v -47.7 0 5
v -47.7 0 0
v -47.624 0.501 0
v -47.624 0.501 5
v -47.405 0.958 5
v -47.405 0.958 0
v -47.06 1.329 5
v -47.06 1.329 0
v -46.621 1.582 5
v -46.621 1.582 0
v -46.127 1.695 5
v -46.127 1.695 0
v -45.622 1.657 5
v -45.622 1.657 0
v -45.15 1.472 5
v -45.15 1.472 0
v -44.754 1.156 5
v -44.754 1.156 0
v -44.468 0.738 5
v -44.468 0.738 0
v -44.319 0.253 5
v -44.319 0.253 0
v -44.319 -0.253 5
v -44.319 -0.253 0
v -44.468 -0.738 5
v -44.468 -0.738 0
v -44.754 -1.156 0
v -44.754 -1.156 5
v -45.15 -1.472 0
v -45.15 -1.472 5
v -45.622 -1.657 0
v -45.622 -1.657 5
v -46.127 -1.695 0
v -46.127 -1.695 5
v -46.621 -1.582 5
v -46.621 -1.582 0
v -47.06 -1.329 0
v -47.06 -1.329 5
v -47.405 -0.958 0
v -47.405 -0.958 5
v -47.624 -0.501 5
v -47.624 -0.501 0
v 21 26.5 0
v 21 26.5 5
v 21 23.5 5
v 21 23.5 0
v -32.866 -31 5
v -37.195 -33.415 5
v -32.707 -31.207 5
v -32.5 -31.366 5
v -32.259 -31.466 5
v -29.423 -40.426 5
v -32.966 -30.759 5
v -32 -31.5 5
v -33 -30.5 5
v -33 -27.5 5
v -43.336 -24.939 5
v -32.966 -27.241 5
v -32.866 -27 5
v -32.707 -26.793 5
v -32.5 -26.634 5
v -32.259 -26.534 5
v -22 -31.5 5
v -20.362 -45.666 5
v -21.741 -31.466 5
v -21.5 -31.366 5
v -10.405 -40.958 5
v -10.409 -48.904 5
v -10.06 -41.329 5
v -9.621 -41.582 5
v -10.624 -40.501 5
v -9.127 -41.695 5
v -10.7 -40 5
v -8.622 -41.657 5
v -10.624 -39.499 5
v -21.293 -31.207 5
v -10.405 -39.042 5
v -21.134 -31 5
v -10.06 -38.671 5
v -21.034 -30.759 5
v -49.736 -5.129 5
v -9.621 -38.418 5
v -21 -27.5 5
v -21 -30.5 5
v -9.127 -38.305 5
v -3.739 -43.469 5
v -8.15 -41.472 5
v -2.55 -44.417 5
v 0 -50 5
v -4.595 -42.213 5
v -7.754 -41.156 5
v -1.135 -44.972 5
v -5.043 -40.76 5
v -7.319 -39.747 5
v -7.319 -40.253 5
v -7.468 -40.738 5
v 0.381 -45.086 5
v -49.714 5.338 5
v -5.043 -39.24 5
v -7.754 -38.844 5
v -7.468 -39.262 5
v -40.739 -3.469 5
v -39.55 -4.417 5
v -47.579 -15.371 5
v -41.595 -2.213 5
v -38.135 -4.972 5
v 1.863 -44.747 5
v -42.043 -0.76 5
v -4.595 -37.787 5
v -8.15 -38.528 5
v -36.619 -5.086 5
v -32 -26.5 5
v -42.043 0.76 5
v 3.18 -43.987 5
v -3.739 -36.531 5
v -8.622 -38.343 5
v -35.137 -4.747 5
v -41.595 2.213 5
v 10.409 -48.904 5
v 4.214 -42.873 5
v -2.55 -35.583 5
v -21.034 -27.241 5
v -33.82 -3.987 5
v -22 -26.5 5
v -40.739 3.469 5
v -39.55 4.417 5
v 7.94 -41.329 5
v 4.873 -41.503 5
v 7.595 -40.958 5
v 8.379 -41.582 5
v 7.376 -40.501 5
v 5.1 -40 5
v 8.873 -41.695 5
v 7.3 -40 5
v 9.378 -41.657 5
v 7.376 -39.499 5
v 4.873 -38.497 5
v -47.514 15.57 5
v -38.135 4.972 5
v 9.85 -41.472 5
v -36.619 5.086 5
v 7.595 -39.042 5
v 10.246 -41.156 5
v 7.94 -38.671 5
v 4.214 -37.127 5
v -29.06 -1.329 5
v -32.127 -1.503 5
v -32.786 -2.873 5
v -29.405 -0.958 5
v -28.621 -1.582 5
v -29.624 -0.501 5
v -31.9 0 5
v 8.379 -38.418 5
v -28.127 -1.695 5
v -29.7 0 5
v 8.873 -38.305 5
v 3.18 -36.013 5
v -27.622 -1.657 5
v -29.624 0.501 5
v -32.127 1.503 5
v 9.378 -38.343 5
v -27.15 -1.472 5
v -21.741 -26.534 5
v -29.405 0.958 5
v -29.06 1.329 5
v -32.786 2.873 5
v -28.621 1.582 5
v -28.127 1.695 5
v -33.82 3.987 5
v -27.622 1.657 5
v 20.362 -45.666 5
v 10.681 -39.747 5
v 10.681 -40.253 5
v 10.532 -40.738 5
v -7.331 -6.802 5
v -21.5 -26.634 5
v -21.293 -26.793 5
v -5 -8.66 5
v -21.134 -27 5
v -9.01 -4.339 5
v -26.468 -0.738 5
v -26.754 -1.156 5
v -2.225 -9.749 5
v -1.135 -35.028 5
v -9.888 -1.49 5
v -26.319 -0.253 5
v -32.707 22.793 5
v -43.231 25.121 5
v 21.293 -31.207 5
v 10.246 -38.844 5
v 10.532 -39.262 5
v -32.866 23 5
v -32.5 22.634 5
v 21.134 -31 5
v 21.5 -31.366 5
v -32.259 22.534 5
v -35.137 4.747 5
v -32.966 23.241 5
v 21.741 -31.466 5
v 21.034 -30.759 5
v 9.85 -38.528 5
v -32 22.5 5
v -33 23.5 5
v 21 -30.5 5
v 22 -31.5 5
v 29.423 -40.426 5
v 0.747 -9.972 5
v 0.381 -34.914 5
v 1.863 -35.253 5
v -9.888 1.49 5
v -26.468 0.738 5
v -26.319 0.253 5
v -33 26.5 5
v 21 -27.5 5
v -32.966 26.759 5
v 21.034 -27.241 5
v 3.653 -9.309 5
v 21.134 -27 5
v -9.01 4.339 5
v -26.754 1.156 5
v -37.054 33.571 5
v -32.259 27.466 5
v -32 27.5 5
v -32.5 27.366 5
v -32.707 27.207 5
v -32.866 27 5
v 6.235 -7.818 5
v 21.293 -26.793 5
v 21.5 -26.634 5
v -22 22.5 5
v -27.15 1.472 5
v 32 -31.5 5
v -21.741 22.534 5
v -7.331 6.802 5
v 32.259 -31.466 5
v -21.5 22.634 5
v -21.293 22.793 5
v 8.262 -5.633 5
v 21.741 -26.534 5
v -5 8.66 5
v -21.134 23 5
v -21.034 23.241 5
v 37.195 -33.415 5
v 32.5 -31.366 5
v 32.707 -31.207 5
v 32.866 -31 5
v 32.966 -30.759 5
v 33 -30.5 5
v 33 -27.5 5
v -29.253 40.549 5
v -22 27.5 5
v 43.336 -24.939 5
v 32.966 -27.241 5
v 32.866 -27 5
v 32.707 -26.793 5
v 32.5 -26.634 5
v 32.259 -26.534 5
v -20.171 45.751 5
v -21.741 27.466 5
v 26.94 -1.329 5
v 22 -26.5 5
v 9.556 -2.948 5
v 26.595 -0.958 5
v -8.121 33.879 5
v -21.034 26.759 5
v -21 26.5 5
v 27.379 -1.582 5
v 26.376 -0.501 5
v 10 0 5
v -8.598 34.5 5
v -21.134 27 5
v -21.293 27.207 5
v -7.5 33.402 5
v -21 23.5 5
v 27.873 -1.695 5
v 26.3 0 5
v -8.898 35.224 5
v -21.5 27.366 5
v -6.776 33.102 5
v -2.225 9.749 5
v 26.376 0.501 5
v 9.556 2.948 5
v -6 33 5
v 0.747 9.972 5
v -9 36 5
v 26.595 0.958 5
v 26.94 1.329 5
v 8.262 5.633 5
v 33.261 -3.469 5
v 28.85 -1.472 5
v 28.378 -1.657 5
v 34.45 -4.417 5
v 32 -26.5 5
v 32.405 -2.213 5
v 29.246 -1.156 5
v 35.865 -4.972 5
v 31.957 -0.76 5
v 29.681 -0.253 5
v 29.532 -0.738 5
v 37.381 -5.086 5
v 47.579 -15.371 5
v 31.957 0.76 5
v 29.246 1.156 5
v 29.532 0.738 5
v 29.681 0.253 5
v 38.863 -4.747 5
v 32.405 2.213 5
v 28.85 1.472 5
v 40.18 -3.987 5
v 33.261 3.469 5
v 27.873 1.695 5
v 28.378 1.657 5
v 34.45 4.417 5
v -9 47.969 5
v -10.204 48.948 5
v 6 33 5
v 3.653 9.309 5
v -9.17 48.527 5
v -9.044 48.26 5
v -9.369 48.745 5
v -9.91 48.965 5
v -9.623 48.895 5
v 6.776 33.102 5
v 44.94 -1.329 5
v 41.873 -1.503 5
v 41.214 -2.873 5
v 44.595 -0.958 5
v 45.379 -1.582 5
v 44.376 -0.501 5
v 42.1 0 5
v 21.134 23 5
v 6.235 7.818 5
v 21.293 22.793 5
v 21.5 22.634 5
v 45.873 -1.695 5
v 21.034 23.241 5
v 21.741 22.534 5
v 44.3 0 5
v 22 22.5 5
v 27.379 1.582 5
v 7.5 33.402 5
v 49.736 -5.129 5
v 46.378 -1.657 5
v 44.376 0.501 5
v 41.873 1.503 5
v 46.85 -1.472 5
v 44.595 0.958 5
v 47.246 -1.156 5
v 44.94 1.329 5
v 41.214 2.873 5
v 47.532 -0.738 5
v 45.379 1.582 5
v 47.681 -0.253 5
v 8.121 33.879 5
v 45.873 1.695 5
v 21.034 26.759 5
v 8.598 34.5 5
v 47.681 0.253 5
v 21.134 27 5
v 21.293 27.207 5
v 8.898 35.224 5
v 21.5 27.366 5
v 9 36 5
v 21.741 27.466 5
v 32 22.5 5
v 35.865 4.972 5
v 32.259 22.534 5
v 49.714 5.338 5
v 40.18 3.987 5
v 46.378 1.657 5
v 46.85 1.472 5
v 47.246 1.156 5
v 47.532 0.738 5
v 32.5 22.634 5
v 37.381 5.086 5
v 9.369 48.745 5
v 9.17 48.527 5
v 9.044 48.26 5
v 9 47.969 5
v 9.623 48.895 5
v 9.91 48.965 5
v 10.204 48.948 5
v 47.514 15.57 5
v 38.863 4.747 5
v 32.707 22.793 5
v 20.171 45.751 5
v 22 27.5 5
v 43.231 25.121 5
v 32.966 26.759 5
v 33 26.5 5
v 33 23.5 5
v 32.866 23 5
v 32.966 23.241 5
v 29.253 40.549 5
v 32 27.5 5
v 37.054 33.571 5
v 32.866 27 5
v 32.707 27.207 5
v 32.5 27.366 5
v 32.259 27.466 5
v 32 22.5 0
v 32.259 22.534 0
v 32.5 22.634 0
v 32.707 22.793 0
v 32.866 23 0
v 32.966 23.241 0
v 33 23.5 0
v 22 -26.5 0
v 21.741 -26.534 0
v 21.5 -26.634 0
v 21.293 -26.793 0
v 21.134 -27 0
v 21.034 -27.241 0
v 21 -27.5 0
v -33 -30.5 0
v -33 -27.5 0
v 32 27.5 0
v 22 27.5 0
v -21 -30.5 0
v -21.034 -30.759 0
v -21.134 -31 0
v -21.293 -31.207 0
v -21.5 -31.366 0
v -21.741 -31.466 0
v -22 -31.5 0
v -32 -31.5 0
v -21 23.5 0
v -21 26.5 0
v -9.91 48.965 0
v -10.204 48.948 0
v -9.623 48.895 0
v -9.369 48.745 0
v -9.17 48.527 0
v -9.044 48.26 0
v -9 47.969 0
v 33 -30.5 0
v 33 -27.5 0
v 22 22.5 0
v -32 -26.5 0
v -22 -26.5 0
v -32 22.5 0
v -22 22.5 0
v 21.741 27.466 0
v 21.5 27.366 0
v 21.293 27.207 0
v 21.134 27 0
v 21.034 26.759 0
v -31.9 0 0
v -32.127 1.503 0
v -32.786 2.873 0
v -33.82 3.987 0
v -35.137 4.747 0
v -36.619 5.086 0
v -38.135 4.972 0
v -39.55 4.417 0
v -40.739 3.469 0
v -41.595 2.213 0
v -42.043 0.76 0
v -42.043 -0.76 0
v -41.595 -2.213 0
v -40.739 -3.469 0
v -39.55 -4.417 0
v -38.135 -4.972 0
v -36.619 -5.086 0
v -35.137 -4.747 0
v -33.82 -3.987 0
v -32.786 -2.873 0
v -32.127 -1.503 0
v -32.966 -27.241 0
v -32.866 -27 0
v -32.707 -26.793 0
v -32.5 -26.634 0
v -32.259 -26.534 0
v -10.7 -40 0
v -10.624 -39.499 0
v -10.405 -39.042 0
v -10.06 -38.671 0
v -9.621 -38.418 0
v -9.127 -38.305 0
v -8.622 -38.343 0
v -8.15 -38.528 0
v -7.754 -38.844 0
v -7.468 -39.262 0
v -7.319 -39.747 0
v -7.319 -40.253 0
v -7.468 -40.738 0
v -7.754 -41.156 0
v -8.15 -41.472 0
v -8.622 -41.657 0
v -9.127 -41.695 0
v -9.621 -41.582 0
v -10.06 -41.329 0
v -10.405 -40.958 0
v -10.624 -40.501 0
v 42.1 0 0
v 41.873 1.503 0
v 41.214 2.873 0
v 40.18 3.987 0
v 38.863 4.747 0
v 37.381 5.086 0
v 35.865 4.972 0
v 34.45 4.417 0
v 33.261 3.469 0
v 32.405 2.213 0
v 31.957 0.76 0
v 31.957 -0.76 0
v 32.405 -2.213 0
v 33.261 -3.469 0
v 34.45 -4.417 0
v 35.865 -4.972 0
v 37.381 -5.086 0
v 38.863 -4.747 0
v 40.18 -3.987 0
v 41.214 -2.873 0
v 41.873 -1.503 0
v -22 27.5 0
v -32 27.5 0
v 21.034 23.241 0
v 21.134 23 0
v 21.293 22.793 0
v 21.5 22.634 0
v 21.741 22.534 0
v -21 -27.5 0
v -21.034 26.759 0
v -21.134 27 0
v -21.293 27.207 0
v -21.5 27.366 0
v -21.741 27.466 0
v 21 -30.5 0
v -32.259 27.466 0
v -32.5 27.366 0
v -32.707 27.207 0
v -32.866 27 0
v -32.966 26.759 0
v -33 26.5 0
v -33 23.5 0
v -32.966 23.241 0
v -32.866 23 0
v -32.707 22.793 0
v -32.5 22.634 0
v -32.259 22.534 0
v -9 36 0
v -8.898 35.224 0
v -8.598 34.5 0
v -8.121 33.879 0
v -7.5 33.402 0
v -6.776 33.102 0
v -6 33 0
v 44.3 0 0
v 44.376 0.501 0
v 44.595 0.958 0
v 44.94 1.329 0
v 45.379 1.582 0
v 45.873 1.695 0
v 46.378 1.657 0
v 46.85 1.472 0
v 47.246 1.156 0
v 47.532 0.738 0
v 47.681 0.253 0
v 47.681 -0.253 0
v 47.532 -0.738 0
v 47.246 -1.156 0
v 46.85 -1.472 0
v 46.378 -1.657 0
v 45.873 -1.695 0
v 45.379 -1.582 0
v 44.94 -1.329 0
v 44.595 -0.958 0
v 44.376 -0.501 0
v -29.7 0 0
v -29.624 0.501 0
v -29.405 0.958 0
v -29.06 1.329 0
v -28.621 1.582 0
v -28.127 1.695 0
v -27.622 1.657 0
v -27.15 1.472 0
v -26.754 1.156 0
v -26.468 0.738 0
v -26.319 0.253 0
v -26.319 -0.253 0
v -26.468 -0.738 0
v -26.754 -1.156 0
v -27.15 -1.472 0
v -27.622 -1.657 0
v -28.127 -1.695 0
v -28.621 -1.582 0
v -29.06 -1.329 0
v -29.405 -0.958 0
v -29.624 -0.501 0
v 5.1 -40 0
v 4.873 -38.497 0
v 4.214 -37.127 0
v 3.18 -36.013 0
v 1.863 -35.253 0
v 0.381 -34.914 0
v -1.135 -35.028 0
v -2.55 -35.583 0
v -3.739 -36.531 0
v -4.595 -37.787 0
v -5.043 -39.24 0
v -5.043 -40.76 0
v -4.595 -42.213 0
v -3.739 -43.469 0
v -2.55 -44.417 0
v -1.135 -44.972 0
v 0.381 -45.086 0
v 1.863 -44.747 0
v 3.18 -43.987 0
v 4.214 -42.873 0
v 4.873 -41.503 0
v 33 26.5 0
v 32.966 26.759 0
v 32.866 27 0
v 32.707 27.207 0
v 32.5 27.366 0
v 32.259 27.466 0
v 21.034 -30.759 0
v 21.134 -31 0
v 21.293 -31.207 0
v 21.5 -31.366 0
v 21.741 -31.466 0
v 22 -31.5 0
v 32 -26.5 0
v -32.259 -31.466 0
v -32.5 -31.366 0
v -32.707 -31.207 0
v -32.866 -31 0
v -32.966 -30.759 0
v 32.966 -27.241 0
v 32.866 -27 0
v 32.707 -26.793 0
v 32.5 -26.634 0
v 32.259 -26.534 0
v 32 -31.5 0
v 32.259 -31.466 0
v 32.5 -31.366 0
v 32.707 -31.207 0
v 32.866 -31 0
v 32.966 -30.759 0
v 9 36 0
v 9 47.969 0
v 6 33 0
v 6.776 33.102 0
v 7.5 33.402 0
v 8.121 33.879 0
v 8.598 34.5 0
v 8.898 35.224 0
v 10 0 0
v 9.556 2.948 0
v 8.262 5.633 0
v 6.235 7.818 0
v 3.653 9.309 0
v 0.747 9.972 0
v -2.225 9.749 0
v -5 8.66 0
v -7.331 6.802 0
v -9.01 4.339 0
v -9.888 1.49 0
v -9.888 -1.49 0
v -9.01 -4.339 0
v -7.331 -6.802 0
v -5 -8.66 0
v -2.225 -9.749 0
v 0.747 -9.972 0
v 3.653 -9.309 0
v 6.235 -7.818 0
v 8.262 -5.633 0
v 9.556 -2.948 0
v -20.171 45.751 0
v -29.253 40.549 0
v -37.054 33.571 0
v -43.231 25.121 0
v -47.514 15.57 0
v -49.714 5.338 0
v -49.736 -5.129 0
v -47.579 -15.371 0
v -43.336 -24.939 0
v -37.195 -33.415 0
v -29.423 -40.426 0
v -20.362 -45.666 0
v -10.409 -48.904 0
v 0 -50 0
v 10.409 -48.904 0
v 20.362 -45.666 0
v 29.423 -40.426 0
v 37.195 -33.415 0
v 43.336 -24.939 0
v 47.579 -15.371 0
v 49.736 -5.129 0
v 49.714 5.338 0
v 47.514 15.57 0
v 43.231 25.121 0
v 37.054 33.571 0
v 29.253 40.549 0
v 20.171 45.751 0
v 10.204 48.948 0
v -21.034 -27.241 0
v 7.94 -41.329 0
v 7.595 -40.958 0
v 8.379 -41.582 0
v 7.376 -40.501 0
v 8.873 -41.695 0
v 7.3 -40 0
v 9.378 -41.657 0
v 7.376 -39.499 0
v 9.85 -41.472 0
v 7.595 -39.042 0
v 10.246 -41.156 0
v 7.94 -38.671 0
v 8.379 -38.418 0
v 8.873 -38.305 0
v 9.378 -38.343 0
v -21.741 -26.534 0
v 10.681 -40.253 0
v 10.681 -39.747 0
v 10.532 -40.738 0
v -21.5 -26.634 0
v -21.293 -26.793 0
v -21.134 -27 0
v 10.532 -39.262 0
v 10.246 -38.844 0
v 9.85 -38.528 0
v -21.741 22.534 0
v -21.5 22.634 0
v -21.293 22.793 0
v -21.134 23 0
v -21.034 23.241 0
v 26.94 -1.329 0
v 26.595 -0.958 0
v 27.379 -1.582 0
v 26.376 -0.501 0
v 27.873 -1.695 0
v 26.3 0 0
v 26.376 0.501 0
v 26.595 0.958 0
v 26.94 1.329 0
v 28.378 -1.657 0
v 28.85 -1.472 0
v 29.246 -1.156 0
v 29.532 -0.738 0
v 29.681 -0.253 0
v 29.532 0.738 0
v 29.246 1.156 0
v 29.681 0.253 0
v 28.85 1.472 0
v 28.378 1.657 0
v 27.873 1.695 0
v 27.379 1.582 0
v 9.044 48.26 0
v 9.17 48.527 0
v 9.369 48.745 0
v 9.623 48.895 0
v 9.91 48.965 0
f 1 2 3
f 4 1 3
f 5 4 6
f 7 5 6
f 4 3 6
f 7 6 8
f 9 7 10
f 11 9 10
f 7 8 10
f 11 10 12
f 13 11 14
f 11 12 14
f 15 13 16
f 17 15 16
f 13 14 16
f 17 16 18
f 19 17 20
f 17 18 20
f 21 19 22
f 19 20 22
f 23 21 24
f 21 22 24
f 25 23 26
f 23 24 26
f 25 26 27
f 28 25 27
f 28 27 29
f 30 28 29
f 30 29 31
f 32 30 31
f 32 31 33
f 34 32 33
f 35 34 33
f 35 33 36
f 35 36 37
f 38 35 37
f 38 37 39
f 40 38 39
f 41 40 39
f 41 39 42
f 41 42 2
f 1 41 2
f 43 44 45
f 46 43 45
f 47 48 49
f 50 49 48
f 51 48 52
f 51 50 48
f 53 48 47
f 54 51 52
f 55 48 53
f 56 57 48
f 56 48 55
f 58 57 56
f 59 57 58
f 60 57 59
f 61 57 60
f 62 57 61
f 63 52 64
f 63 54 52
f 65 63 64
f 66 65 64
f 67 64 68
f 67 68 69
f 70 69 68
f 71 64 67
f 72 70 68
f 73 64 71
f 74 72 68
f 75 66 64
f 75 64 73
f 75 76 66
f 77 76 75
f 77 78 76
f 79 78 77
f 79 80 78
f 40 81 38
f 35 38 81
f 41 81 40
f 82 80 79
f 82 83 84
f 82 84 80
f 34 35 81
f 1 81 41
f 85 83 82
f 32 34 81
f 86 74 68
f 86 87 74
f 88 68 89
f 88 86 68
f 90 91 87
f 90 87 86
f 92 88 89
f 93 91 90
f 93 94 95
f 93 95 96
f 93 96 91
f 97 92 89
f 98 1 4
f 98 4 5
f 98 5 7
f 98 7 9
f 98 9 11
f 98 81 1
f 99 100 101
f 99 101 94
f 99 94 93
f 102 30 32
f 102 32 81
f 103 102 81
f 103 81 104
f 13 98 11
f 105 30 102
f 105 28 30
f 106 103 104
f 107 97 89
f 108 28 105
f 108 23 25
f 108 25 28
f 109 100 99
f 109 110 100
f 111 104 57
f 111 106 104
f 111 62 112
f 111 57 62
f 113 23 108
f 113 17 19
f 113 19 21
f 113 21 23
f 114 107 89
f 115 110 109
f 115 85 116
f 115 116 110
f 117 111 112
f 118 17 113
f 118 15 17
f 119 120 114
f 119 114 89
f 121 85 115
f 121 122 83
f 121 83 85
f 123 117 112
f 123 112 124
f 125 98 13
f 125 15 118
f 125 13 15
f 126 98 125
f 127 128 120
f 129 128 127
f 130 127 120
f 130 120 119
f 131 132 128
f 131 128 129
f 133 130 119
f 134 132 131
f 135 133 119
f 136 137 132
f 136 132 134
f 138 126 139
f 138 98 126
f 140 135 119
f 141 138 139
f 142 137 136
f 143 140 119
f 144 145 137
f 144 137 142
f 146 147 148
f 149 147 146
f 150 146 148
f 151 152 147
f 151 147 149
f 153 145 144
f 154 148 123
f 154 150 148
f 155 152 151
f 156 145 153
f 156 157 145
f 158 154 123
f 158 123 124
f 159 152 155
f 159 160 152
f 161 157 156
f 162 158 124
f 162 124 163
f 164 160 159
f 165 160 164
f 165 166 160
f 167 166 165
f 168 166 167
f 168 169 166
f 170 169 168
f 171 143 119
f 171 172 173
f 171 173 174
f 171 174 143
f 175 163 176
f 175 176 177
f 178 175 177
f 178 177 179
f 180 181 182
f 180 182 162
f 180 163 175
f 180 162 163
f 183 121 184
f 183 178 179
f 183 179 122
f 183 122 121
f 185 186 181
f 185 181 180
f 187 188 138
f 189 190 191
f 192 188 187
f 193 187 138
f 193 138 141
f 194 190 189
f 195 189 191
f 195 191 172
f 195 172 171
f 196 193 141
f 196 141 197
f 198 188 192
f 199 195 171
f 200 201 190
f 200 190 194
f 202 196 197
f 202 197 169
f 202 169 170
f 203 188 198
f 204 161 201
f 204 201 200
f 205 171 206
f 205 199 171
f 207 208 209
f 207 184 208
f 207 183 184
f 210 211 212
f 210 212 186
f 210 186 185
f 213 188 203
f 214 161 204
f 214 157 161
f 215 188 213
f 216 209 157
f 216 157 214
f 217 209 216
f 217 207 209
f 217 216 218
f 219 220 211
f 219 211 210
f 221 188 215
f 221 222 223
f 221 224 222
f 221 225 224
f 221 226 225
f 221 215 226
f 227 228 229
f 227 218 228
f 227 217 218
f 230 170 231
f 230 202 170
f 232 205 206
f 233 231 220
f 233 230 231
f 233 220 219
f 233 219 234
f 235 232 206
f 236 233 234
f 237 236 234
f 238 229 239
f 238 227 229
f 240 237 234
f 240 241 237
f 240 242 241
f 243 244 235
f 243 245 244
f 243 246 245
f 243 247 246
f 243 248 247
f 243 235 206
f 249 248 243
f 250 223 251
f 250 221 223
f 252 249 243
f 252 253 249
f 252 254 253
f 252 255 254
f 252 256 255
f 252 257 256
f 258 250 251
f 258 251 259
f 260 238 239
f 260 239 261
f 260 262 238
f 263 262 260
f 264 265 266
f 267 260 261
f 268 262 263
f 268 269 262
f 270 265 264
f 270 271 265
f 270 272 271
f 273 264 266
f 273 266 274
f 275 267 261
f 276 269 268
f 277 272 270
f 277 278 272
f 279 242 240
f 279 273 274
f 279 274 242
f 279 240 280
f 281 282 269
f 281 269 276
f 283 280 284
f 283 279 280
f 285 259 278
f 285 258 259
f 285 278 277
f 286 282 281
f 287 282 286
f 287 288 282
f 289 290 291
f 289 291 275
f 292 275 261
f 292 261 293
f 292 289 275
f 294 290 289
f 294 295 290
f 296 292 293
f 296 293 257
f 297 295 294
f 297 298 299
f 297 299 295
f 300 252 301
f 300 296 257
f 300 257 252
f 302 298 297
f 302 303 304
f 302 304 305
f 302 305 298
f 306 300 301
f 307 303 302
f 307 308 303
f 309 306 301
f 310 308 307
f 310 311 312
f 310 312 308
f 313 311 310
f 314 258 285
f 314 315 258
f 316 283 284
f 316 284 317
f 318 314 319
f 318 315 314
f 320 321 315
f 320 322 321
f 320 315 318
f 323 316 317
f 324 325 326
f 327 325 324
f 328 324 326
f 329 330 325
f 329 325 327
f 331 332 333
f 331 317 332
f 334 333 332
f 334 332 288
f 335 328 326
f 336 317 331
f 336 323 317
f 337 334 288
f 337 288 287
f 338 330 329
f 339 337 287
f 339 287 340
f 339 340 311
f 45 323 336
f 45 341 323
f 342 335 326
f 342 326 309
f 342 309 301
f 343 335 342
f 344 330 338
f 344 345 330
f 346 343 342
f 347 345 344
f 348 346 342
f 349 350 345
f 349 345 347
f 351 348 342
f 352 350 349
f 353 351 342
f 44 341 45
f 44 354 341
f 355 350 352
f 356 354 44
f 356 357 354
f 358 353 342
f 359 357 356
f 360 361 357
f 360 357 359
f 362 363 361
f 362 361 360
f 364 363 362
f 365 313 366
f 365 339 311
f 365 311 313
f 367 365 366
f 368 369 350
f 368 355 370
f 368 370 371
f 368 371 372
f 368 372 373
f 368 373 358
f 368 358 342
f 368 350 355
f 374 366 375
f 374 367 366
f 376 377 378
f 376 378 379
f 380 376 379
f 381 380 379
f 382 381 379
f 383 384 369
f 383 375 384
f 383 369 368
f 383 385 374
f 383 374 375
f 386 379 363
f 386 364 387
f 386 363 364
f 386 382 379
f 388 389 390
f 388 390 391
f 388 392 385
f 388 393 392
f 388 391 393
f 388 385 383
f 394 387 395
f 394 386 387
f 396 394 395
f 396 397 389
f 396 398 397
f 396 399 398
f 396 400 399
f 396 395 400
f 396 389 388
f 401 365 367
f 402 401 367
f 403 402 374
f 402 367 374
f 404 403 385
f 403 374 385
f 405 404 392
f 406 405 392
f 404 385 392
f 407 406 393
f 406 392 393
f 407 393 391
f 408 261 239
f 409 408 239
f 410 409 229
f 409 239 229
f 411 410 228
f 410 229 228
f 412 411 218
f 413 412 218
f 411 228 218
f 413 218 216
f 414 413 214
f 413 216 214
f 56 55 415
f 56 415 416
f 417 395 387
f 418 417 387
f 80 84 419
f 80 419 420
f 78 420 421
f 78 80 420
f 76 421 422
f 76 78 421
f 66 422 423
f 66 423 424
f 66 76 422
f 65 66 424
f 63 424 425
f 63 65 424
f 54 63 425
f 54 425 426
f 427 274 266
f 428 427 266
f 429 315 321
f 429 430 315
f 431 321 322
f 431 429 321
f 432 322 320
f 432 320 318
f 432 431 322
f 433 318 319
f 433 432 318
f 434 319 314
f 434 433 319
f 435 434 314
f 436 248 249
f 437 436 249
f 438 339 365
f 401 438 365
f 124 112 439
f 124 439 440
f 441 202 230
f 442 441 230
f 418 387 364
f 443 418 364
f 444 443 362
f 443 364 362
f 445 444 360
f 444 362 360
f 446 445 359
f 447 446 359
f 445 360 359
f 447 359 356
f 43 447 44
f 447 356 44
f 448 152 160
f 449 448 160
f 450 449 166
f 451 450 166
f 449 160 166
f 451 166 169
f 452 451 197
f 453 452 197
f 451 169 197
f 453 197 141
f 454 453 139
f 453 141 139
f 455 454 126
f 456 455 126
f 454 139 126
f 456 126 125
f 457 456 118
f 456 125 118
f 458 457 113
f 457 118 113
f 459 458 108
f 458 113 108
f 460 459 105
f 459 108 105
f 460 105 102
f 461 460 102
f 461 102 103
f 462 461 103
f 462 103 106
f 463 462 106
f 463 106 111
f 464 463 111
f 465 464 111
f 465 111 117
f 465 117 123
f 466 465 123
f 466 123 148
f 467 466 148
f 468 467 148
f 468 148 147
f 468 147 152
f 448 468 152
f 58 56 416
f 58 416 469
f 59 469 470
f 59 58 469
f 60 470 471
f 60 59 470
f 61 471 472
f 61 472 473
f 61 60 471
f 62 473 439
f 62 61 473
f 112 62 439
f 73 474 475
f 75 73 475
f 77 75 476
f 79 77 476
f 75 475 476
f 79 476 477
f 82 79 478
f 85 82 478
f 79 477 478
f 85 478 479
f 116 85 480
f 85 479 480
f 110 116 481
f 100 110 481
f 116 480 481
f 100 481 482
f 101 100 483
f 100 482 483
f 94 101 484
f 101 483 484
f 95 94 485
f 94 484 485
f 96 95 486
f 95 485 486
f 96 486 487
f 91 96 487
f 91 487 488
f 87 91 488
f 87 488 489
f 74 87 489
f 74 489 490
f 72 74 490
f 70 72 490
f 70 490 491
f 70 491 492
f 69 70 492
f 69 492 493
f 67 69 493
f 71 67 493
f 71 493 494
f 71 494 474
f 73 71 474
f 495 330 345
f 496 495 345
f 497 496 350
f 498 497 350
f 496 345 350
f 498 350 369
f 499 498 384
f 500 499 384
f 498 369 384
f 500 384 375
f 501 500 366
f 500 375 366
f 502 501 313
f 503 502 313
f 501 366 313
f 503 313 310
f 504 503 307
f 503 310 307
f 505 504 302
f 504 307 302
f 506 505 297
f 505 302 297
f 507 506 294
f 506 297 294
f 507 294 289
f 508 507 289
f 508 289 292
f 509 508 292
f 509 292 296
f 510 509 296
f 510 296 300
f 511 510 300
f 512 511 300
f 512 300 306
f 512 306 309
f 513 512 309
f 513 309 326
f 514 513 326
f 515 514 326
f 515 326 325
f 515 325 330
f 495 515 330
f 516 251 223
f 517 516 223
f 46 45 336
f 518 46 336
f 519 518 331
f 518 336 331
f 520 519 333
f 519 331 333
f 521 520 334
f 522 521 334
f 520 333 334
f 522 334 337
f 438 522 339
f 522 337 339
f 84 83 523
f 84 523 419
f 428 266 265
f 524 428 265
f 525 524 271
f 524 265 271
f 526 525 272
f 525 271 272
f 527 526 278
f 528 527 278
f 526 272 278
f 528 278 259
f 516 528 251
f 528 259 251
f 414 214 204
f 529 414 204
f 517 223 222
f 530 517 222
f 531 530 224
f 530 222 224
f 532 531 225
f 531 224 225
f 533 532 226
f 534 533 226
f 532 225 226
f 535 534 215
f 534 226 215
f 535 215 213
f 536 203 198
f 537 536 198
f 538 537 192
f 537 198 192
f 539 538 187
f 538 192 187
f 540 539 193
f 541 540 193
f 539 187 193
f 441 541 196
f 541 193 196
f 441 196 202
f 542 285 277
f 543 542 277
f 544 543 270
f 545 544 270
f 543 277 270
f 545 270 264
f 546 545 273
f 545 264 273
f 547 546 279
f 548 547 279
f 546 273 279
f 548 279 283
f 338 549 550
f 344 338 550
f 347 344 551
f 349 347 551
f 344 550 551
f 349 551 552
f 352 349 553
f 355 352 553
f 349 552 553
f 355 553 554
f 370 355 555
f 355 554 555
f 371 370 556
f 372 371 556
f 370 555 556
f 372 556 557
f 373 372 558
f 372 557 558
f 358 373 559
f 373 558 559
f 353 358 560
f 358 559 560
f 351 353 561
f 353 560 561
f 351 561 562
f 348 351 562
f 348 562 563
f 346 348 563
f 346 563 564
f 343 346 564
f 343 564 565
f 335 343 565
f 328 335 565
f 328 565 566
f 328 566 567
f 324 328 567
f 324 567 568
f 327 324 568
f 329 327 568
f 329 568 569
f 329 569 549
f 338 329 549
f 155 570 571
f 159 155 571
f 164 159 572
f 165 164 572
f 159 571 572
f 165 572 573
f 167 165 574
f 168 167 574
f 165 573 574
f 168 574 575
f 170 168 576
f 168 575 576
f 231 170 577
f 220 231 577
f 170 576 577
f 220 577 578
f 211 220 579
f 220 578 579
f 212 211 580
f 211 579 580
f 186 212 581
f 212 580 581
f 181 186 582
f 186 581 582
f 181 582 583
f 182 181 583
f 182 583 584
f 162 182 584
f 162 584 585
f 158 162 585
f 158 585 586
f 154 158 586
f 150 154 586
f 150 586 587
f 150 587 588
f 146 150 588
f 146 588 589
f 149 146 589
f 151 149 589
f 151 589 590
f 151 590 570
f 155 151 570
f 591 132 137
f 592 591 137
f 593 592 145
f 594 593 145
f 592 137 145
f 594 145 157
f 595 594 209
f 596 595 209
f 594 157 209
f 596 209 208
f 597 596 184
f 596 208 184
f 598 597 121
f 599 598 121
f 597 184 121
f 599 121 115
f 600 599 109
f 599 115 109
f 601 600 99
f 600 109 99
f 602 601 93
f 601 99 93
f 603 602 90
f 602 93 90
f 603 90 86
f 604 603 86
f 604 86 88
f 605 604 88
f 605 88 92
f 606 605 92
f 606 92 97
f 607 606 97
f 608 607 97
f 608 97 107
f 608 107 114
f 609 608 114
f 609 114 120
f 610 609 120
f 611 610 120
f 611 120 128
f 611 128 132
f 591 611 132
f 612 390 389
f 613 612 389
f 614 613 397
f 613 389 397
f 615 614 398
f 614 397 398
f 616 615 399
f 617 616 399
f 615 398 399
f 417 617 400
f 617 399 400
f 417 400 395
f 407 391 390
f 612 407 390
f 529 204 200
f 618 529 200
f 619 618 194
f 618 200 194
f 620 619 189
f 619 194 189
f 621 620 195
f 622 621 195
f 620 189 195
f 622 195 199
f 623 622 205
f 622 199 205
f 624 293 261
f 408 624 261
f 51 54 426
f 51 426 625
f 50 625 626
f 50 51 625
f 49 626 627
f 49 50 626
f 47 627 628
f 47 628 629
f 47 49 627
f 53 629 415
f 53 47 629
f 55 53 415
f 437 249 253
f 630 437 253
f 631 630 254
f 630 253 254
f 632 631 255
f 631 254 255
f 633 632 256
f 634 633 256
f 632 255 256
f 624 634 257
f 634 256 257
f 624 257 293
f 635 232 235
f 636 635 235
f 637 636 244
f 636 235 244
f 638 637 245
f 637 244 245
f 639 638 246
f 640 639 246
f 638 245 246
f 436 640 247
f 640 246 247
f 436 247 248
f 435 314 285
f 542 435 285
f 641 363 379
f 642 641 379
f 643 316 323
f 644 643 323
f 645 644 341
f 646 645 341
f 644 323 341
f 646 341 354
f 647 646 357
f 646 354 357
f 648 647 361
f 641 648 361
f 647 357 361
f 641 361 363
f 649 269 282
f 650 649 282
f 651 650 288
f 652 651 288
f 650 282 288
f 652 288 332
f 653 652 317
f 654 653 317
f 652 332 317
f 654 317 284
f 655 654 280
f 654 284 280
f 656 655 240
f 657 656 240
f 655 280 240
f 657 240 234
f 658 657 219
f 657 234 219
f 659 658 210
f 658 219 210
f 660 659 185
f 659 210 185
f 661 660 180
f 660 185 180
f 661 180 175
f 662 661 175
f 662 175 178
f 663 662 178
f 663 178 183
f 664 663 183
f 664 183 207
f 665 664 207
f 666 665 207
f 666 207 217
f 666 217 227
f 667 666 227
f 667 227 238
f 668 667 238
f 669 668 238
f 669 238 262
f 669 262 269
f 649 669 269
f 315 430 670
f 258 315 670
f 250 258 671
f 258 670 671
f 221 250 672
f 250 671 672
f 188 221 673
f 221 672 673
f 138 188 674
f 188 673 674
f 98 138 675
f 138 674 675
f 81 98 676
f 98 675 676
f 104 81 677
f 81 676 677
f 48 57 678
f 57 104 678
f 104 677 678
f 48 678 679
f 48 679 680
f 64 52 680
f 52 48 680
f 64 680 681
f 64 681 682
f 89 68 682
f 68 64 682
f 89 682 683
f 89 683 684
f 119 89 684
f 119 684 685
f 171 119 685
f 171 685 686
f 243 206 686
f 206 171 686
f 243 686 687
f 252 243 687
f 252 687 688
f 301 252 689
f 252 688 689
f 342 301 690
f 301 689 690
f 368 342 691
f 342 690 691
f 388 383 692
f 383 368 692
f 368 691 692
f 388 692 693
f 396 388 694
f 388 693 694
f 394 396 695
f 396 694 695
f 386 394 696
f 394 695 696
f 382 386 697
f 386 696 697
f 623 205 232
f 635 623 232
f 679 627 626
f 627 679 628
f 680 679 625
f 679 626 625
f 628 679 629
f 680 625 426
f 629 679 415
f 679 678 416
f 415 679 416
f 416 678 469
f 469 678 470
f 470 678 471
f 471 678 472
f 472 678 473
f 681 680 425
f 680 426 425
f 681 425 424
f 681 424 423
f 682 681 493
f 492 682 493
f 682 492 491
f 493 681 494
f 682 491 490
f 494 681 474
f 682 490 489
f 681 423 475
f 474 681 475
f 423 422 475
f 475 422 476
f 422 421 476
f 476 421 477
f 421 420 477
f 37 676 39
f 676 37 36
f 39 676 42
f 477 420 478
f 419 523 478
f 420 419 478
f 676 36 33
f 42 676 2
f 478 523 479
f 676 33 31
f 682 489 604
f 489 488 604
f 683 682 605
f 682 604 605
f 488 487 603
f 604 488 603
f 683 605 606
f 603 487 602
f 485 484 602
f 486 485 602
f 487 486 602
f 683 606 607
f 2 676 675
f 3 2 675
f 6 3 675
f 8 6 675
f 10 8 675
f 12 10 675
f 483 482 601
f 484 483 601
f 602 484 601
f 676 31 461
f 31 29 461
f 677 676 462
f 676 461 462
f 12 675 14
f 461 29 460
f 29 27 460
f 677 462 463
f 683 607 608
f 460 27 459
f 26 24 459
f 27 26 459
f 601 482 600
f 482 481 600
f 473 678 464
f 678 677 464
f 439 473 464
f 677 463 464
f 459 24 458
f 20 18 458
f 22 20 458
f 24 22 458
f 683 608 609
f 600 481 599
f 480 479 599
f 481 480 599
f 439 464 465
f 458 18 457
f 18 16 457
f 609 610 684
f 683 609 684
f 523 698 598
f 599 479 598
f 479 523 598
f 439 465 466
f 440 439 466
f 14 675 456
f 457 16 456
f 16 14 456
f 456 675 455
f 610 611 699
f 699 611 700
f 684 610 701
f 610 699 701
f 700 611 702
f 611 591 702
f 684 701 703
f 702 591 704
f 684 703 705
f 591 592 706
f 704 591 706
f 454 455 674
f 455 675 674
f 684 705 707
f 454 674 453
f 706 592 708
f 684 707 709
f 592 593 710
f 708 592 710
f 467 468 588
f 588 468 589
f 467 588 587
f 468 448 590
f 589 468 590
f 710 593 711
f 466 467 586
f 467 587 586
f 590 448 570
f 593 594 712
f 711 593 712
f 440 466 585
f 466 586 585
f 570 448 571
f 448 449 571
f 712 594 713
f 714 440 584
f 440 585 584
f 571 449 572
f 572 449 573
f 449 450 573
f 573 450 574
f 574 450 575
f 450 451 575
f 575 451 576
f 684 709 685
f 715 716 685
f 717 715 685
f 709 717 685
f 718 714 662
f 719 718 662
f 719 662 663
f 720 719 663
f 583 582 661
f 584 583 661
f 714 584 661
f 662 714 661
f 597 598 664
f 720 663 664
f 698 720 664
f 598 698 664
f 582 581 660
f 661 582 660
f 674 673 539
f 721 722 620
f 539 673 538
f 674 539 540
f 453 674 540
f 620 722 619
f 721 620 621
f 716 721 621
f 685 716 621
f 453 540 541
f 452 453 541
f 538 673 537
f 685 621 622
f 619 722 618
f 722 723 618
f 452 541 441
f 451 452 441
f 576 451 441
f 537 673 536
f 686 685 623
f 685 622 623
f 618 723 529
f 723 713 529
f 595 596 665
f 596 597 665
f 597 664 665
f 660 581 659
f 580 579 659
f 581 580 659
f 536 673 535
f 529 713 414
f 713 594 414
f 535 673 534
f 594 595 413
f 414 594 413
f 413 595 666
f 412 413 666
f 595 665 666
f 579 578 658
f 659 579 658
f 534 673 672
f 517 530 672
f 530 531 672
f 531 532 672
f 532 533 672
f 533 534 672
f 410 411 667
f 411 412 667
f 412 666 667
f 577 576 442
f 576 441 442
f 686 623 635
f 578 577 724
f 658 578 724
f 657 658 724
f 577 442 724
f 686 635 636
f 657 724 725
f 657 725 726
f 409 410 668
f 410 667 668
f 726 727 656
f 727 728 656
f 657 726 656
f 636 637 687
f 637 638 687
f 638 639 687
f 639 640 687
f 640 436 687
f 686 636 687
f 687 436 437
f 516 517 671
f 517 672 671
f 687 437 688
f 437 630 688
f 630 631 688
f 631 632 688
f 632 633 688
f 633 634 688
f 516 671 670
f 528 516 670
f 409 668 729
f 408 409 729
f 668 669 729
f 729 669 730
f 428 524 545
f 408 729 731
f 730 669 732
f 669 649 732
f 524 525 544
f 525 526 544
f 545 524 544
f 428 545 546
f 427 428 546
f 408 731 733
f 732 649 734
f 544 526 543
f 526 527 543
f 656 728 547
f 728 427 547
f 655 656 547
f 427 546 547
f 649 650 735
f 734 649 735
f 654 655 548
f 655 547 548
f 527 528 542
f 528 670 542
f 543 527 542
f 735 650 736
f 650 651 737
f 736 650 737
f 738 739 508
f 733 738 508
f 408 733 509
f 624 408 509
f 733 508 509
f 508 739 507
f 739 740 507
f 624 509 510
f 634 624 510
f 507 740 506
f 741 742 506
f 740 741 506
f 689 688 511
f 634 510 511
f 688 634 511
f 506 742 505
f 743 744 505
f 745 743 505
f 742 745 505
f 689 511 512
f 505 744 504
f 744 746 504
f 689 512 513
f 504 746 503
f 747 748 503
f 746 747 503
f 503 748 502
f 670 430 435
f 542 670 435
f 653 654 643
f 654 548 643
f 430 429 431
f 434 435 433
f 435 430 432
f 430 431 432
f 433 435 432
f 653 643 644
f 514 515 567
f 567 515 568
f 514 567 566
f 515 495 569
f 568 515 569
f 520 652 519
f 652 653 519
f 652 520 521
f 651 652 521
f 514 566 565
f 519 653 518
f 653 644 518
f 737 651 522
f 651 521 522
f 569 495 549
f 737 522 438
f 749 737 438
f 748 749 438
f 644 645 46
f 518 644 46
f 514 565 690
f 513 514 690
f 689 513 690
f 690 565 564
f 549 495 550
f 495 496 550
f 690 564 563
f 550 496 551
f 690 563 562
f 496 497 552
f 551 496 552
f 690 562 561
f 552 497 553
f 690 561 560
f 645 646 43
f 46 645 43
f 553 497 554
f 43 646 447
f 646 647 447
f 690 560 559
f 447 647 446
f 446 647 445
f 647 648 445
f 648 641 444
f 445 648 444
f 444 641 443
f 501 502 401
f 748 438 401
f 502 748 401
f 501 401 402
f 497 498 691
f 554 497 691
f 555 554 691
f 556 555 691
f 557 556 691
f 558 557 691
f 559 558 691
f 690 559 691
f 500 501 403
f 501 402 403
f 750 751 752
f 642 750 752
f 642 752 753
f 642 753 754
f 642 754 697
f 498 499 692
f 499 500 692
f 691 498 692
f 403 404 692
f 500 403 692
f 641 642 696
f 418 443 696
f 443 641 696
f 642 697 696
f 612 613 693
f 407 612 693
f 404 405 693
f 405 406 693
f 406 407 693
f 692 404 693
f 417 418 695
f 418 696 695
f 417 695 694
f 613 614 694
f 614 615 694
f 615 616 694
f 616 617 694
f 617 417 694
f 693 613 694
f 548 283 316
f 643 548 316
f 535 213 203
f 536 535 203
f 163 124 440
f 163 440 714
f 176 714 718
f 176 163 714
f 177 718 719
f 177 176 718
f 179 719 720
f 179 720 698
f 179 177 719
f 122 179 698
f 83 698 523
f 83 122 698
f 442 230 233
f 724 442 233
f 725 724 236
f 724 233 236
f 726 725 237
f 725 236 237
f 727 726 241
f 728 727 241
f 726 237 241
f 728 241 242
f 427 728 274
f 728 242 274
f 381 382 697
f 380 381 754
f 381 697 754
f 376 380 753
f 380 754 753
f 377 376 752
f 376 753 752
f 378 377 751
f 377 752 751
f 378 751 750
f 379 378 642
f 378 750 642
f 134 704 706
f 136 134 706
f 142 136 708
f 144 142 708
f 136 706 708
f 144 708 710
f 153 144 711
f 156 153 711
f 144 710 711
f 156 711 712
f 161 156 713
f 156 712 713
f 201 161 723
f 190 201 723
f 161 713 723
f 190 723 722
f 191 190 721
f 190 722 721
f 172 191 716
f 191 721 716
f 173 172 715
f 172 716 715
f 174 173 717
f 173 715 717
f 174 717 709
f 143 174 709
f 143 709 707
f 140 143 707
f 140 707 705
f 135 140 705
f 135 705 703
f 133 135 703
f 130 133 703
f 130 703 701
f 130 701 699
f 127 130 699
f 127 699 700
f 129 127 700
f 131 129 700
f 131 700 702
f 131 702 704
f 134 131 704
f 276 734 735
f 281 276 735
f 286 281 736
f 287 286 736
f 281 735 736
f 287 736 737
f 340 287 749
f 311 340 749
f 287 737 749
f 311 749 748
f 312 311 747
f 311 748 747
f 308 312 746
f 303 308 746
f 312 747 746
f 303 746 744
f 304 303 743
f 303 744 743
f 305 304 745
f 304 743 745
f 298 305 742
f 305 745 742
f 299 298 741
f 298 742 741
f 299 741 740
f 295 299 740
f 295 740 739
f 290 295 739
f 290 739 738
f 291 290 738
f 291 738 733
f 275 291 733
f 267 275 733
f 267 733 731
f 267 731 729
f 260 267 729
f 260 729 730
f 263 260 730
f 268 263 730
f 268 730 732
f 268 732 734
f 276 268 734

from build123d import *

# Parameters (mm, degrees)
SKETCH1_R                    = 50
BOSS_EXTRUDE1_DEPTH          = 5
F_10_2_10_2_DIAMETER_HOLE1_D = 10.2
M3_CLEARANCE_HOLE1_D         = 3.4
CUT_EXTRUDE2_DEPTH           = 5
CUT_EXTRUDE3_DEPTH           = 10
FILLET1_R                    = 1
SKETCH13_R                   = 10
CUT_EXTRUDE4_DEPTH           = 10


with BuildPart() as part:
    # Sketch1 → Boss-Extrude1 (new body)
    with BuildSketch(Plane.XY):
        Circle(SKETCH1_R)
    extrude(amount=BOSS_EXTRUDE1_DEPTH)

    # Ø10.2 (10.2) Diameter Hole1 (through all)
    with Locations(Plane(origin=(0, 0, 0), x_dir=(-1, 0, 0), z_dir=(0, 0, -1))):
        with Locations((37, 0), (-37, 0), (0, -40)):
            Hole(F_10_2_10_2_DIAMETER_HOLE1_D / 2)

    # M3 Clearance Hole1 (through all)
    with Locations(Plane.XY.offset(5)):
        with Locations((46, 0), (28, 0), (9, -40), (-9, -40), (-46, 0), (-28, 0)):
            Hole(M3_CLEARANCE_HOLE1_D / 2)

    # Sketch11 → Cut-Extrude2 (cut)
    with BuildSketch(Plane.XY.offset(5)):
        with BuildLine():
            Line((22, 22.5), (32, 22.5))
            ThreePointArc((32, 22.5), (32.707106781, 22.792893219), (33, 23.5))
            Line((33, 23.5), (33, 26.5))
            ThreePointArc((33, 26.5), (32.707106781, 27.207106781), (32, 27.5))
            Line((32, 27.5), (22, 27.5))
            ThreePointArc((22, 27.5), (21.292893219, 27.207106781), (21, 26.5))
            Line((21, 26.5), (21, 23.5))
            ThreePointArc((21, 23.5), (21.292893219, 22.792893219), (22, 22.5))
        make_face()
        with BuildLine():
            Line((-22, 27.5), (-32, 27.5))
            ThreePointArc((-32, 27.5), (-32.707106781, 27.207106781), (-33, 26.5))
            Line((-33, 26.5), (-33, 23.5))
            ThreePointArc((-33, 23.5), (-32.707106781, 22.792893219), (-32, 22.5))
            Line((-32, 22.5), (-22, 22.5))
            ThreePointArc((-22, 22.5), (-21.292893219, 22.792893219), (-21, 23.5))
            Line((-21, 23.5), (-21, 26.5))
            ThreePointArc((-21, 26.5), (-21.292893219, 27.207106781), (-22, 27.5))
        make_face()
        with BuildLine():
            Line((-21, -27.5), (-21, -30.5))
            ThreePointArc((-21, -30.5), (-21.292893219, -31.207106781), (-22, -31.5))
            Line((-22, -31.5), (-32, -31.5))
            ThreePointArc((-32, -31.5), (-32.707106781, -31.207106781), (-33, -30.5))
            Line((-33, -30.5), (-33, -27.5))
            ThreePointArc((-33, -27.5), (-32.707106781, -26.792893219), (-32, -26.5))
            Line((-32, -26.5), (-22, -26.5))
            ThreePointArc((-22, -26.5), (-21.292893219, -26.792893219), (-21, -27.5))
        make_face()
        with BuildLine():
            Line((22, -31.5), (32, -31.5))
            ThreePointArc((32, -31.5), (32.707106781, -31.207106781), (33, -30.5))
            Line((33, -30.5), (33, -27.5))
            ThreePointArc((33, -27.5), (32.707106781, -26.792893219), (32, -26.5))
            Line((32, -26.5), (22, -26.5))
            ThreePointArc((22, -26.5), (21.292893219, -26.792893219), (21, -27.5))
            Line((21, -27.5), (21, -30.5))
            ThreePointArc((21, -30.5), (21.292893219, -31.207106781), (22, -31.5))
        make_face()
    extrude(amount=-CUT_EXTRUDE2_DEPTH, mode=Mode.SUBTRACT)

    # Sketch12 → Cut-Extrude3 (cut)
    with BuildSketch(Plane.XY.offset(5)):
        with BuildLine():
            Line((-6, 33), (6, 33))
            ThreePointArc((6, 33), (8.121320344, 33.878679656), (9, 36))
            Line((9, 36), (9, 50))
            Line((9, 50), (-9, 50))
            Line((-9, 50), (-9, 36))
            ThreePointArc((-9, 36), (-8.121320344, 33.878679656), (-6, 33))
        make_face()
    extrude(amount=-CUT_EXTRUDE3_DEPTH, mode=Mode.SUBTRACT)

    # Fillet1
    fillet1_edges = [part.edges().sort_by_distance(p)[0] for p in [
        (-9, 49.183330509, 2.5),
        (9, 49.183330509, 2.5),
    ]]
    fillet(fillet1_edges, radius=FILLET1_R)

    # Sketch13 → Cut-Extrude4 (cut)
    with BuildSketch(Plane.XY.offset(5)):
        Circle(SKETCH13_R)
    extrude(amount=-CUT_EXTRUDE4_DEPTH, mode=Mode.SUBTRACT)


solid = part.part
